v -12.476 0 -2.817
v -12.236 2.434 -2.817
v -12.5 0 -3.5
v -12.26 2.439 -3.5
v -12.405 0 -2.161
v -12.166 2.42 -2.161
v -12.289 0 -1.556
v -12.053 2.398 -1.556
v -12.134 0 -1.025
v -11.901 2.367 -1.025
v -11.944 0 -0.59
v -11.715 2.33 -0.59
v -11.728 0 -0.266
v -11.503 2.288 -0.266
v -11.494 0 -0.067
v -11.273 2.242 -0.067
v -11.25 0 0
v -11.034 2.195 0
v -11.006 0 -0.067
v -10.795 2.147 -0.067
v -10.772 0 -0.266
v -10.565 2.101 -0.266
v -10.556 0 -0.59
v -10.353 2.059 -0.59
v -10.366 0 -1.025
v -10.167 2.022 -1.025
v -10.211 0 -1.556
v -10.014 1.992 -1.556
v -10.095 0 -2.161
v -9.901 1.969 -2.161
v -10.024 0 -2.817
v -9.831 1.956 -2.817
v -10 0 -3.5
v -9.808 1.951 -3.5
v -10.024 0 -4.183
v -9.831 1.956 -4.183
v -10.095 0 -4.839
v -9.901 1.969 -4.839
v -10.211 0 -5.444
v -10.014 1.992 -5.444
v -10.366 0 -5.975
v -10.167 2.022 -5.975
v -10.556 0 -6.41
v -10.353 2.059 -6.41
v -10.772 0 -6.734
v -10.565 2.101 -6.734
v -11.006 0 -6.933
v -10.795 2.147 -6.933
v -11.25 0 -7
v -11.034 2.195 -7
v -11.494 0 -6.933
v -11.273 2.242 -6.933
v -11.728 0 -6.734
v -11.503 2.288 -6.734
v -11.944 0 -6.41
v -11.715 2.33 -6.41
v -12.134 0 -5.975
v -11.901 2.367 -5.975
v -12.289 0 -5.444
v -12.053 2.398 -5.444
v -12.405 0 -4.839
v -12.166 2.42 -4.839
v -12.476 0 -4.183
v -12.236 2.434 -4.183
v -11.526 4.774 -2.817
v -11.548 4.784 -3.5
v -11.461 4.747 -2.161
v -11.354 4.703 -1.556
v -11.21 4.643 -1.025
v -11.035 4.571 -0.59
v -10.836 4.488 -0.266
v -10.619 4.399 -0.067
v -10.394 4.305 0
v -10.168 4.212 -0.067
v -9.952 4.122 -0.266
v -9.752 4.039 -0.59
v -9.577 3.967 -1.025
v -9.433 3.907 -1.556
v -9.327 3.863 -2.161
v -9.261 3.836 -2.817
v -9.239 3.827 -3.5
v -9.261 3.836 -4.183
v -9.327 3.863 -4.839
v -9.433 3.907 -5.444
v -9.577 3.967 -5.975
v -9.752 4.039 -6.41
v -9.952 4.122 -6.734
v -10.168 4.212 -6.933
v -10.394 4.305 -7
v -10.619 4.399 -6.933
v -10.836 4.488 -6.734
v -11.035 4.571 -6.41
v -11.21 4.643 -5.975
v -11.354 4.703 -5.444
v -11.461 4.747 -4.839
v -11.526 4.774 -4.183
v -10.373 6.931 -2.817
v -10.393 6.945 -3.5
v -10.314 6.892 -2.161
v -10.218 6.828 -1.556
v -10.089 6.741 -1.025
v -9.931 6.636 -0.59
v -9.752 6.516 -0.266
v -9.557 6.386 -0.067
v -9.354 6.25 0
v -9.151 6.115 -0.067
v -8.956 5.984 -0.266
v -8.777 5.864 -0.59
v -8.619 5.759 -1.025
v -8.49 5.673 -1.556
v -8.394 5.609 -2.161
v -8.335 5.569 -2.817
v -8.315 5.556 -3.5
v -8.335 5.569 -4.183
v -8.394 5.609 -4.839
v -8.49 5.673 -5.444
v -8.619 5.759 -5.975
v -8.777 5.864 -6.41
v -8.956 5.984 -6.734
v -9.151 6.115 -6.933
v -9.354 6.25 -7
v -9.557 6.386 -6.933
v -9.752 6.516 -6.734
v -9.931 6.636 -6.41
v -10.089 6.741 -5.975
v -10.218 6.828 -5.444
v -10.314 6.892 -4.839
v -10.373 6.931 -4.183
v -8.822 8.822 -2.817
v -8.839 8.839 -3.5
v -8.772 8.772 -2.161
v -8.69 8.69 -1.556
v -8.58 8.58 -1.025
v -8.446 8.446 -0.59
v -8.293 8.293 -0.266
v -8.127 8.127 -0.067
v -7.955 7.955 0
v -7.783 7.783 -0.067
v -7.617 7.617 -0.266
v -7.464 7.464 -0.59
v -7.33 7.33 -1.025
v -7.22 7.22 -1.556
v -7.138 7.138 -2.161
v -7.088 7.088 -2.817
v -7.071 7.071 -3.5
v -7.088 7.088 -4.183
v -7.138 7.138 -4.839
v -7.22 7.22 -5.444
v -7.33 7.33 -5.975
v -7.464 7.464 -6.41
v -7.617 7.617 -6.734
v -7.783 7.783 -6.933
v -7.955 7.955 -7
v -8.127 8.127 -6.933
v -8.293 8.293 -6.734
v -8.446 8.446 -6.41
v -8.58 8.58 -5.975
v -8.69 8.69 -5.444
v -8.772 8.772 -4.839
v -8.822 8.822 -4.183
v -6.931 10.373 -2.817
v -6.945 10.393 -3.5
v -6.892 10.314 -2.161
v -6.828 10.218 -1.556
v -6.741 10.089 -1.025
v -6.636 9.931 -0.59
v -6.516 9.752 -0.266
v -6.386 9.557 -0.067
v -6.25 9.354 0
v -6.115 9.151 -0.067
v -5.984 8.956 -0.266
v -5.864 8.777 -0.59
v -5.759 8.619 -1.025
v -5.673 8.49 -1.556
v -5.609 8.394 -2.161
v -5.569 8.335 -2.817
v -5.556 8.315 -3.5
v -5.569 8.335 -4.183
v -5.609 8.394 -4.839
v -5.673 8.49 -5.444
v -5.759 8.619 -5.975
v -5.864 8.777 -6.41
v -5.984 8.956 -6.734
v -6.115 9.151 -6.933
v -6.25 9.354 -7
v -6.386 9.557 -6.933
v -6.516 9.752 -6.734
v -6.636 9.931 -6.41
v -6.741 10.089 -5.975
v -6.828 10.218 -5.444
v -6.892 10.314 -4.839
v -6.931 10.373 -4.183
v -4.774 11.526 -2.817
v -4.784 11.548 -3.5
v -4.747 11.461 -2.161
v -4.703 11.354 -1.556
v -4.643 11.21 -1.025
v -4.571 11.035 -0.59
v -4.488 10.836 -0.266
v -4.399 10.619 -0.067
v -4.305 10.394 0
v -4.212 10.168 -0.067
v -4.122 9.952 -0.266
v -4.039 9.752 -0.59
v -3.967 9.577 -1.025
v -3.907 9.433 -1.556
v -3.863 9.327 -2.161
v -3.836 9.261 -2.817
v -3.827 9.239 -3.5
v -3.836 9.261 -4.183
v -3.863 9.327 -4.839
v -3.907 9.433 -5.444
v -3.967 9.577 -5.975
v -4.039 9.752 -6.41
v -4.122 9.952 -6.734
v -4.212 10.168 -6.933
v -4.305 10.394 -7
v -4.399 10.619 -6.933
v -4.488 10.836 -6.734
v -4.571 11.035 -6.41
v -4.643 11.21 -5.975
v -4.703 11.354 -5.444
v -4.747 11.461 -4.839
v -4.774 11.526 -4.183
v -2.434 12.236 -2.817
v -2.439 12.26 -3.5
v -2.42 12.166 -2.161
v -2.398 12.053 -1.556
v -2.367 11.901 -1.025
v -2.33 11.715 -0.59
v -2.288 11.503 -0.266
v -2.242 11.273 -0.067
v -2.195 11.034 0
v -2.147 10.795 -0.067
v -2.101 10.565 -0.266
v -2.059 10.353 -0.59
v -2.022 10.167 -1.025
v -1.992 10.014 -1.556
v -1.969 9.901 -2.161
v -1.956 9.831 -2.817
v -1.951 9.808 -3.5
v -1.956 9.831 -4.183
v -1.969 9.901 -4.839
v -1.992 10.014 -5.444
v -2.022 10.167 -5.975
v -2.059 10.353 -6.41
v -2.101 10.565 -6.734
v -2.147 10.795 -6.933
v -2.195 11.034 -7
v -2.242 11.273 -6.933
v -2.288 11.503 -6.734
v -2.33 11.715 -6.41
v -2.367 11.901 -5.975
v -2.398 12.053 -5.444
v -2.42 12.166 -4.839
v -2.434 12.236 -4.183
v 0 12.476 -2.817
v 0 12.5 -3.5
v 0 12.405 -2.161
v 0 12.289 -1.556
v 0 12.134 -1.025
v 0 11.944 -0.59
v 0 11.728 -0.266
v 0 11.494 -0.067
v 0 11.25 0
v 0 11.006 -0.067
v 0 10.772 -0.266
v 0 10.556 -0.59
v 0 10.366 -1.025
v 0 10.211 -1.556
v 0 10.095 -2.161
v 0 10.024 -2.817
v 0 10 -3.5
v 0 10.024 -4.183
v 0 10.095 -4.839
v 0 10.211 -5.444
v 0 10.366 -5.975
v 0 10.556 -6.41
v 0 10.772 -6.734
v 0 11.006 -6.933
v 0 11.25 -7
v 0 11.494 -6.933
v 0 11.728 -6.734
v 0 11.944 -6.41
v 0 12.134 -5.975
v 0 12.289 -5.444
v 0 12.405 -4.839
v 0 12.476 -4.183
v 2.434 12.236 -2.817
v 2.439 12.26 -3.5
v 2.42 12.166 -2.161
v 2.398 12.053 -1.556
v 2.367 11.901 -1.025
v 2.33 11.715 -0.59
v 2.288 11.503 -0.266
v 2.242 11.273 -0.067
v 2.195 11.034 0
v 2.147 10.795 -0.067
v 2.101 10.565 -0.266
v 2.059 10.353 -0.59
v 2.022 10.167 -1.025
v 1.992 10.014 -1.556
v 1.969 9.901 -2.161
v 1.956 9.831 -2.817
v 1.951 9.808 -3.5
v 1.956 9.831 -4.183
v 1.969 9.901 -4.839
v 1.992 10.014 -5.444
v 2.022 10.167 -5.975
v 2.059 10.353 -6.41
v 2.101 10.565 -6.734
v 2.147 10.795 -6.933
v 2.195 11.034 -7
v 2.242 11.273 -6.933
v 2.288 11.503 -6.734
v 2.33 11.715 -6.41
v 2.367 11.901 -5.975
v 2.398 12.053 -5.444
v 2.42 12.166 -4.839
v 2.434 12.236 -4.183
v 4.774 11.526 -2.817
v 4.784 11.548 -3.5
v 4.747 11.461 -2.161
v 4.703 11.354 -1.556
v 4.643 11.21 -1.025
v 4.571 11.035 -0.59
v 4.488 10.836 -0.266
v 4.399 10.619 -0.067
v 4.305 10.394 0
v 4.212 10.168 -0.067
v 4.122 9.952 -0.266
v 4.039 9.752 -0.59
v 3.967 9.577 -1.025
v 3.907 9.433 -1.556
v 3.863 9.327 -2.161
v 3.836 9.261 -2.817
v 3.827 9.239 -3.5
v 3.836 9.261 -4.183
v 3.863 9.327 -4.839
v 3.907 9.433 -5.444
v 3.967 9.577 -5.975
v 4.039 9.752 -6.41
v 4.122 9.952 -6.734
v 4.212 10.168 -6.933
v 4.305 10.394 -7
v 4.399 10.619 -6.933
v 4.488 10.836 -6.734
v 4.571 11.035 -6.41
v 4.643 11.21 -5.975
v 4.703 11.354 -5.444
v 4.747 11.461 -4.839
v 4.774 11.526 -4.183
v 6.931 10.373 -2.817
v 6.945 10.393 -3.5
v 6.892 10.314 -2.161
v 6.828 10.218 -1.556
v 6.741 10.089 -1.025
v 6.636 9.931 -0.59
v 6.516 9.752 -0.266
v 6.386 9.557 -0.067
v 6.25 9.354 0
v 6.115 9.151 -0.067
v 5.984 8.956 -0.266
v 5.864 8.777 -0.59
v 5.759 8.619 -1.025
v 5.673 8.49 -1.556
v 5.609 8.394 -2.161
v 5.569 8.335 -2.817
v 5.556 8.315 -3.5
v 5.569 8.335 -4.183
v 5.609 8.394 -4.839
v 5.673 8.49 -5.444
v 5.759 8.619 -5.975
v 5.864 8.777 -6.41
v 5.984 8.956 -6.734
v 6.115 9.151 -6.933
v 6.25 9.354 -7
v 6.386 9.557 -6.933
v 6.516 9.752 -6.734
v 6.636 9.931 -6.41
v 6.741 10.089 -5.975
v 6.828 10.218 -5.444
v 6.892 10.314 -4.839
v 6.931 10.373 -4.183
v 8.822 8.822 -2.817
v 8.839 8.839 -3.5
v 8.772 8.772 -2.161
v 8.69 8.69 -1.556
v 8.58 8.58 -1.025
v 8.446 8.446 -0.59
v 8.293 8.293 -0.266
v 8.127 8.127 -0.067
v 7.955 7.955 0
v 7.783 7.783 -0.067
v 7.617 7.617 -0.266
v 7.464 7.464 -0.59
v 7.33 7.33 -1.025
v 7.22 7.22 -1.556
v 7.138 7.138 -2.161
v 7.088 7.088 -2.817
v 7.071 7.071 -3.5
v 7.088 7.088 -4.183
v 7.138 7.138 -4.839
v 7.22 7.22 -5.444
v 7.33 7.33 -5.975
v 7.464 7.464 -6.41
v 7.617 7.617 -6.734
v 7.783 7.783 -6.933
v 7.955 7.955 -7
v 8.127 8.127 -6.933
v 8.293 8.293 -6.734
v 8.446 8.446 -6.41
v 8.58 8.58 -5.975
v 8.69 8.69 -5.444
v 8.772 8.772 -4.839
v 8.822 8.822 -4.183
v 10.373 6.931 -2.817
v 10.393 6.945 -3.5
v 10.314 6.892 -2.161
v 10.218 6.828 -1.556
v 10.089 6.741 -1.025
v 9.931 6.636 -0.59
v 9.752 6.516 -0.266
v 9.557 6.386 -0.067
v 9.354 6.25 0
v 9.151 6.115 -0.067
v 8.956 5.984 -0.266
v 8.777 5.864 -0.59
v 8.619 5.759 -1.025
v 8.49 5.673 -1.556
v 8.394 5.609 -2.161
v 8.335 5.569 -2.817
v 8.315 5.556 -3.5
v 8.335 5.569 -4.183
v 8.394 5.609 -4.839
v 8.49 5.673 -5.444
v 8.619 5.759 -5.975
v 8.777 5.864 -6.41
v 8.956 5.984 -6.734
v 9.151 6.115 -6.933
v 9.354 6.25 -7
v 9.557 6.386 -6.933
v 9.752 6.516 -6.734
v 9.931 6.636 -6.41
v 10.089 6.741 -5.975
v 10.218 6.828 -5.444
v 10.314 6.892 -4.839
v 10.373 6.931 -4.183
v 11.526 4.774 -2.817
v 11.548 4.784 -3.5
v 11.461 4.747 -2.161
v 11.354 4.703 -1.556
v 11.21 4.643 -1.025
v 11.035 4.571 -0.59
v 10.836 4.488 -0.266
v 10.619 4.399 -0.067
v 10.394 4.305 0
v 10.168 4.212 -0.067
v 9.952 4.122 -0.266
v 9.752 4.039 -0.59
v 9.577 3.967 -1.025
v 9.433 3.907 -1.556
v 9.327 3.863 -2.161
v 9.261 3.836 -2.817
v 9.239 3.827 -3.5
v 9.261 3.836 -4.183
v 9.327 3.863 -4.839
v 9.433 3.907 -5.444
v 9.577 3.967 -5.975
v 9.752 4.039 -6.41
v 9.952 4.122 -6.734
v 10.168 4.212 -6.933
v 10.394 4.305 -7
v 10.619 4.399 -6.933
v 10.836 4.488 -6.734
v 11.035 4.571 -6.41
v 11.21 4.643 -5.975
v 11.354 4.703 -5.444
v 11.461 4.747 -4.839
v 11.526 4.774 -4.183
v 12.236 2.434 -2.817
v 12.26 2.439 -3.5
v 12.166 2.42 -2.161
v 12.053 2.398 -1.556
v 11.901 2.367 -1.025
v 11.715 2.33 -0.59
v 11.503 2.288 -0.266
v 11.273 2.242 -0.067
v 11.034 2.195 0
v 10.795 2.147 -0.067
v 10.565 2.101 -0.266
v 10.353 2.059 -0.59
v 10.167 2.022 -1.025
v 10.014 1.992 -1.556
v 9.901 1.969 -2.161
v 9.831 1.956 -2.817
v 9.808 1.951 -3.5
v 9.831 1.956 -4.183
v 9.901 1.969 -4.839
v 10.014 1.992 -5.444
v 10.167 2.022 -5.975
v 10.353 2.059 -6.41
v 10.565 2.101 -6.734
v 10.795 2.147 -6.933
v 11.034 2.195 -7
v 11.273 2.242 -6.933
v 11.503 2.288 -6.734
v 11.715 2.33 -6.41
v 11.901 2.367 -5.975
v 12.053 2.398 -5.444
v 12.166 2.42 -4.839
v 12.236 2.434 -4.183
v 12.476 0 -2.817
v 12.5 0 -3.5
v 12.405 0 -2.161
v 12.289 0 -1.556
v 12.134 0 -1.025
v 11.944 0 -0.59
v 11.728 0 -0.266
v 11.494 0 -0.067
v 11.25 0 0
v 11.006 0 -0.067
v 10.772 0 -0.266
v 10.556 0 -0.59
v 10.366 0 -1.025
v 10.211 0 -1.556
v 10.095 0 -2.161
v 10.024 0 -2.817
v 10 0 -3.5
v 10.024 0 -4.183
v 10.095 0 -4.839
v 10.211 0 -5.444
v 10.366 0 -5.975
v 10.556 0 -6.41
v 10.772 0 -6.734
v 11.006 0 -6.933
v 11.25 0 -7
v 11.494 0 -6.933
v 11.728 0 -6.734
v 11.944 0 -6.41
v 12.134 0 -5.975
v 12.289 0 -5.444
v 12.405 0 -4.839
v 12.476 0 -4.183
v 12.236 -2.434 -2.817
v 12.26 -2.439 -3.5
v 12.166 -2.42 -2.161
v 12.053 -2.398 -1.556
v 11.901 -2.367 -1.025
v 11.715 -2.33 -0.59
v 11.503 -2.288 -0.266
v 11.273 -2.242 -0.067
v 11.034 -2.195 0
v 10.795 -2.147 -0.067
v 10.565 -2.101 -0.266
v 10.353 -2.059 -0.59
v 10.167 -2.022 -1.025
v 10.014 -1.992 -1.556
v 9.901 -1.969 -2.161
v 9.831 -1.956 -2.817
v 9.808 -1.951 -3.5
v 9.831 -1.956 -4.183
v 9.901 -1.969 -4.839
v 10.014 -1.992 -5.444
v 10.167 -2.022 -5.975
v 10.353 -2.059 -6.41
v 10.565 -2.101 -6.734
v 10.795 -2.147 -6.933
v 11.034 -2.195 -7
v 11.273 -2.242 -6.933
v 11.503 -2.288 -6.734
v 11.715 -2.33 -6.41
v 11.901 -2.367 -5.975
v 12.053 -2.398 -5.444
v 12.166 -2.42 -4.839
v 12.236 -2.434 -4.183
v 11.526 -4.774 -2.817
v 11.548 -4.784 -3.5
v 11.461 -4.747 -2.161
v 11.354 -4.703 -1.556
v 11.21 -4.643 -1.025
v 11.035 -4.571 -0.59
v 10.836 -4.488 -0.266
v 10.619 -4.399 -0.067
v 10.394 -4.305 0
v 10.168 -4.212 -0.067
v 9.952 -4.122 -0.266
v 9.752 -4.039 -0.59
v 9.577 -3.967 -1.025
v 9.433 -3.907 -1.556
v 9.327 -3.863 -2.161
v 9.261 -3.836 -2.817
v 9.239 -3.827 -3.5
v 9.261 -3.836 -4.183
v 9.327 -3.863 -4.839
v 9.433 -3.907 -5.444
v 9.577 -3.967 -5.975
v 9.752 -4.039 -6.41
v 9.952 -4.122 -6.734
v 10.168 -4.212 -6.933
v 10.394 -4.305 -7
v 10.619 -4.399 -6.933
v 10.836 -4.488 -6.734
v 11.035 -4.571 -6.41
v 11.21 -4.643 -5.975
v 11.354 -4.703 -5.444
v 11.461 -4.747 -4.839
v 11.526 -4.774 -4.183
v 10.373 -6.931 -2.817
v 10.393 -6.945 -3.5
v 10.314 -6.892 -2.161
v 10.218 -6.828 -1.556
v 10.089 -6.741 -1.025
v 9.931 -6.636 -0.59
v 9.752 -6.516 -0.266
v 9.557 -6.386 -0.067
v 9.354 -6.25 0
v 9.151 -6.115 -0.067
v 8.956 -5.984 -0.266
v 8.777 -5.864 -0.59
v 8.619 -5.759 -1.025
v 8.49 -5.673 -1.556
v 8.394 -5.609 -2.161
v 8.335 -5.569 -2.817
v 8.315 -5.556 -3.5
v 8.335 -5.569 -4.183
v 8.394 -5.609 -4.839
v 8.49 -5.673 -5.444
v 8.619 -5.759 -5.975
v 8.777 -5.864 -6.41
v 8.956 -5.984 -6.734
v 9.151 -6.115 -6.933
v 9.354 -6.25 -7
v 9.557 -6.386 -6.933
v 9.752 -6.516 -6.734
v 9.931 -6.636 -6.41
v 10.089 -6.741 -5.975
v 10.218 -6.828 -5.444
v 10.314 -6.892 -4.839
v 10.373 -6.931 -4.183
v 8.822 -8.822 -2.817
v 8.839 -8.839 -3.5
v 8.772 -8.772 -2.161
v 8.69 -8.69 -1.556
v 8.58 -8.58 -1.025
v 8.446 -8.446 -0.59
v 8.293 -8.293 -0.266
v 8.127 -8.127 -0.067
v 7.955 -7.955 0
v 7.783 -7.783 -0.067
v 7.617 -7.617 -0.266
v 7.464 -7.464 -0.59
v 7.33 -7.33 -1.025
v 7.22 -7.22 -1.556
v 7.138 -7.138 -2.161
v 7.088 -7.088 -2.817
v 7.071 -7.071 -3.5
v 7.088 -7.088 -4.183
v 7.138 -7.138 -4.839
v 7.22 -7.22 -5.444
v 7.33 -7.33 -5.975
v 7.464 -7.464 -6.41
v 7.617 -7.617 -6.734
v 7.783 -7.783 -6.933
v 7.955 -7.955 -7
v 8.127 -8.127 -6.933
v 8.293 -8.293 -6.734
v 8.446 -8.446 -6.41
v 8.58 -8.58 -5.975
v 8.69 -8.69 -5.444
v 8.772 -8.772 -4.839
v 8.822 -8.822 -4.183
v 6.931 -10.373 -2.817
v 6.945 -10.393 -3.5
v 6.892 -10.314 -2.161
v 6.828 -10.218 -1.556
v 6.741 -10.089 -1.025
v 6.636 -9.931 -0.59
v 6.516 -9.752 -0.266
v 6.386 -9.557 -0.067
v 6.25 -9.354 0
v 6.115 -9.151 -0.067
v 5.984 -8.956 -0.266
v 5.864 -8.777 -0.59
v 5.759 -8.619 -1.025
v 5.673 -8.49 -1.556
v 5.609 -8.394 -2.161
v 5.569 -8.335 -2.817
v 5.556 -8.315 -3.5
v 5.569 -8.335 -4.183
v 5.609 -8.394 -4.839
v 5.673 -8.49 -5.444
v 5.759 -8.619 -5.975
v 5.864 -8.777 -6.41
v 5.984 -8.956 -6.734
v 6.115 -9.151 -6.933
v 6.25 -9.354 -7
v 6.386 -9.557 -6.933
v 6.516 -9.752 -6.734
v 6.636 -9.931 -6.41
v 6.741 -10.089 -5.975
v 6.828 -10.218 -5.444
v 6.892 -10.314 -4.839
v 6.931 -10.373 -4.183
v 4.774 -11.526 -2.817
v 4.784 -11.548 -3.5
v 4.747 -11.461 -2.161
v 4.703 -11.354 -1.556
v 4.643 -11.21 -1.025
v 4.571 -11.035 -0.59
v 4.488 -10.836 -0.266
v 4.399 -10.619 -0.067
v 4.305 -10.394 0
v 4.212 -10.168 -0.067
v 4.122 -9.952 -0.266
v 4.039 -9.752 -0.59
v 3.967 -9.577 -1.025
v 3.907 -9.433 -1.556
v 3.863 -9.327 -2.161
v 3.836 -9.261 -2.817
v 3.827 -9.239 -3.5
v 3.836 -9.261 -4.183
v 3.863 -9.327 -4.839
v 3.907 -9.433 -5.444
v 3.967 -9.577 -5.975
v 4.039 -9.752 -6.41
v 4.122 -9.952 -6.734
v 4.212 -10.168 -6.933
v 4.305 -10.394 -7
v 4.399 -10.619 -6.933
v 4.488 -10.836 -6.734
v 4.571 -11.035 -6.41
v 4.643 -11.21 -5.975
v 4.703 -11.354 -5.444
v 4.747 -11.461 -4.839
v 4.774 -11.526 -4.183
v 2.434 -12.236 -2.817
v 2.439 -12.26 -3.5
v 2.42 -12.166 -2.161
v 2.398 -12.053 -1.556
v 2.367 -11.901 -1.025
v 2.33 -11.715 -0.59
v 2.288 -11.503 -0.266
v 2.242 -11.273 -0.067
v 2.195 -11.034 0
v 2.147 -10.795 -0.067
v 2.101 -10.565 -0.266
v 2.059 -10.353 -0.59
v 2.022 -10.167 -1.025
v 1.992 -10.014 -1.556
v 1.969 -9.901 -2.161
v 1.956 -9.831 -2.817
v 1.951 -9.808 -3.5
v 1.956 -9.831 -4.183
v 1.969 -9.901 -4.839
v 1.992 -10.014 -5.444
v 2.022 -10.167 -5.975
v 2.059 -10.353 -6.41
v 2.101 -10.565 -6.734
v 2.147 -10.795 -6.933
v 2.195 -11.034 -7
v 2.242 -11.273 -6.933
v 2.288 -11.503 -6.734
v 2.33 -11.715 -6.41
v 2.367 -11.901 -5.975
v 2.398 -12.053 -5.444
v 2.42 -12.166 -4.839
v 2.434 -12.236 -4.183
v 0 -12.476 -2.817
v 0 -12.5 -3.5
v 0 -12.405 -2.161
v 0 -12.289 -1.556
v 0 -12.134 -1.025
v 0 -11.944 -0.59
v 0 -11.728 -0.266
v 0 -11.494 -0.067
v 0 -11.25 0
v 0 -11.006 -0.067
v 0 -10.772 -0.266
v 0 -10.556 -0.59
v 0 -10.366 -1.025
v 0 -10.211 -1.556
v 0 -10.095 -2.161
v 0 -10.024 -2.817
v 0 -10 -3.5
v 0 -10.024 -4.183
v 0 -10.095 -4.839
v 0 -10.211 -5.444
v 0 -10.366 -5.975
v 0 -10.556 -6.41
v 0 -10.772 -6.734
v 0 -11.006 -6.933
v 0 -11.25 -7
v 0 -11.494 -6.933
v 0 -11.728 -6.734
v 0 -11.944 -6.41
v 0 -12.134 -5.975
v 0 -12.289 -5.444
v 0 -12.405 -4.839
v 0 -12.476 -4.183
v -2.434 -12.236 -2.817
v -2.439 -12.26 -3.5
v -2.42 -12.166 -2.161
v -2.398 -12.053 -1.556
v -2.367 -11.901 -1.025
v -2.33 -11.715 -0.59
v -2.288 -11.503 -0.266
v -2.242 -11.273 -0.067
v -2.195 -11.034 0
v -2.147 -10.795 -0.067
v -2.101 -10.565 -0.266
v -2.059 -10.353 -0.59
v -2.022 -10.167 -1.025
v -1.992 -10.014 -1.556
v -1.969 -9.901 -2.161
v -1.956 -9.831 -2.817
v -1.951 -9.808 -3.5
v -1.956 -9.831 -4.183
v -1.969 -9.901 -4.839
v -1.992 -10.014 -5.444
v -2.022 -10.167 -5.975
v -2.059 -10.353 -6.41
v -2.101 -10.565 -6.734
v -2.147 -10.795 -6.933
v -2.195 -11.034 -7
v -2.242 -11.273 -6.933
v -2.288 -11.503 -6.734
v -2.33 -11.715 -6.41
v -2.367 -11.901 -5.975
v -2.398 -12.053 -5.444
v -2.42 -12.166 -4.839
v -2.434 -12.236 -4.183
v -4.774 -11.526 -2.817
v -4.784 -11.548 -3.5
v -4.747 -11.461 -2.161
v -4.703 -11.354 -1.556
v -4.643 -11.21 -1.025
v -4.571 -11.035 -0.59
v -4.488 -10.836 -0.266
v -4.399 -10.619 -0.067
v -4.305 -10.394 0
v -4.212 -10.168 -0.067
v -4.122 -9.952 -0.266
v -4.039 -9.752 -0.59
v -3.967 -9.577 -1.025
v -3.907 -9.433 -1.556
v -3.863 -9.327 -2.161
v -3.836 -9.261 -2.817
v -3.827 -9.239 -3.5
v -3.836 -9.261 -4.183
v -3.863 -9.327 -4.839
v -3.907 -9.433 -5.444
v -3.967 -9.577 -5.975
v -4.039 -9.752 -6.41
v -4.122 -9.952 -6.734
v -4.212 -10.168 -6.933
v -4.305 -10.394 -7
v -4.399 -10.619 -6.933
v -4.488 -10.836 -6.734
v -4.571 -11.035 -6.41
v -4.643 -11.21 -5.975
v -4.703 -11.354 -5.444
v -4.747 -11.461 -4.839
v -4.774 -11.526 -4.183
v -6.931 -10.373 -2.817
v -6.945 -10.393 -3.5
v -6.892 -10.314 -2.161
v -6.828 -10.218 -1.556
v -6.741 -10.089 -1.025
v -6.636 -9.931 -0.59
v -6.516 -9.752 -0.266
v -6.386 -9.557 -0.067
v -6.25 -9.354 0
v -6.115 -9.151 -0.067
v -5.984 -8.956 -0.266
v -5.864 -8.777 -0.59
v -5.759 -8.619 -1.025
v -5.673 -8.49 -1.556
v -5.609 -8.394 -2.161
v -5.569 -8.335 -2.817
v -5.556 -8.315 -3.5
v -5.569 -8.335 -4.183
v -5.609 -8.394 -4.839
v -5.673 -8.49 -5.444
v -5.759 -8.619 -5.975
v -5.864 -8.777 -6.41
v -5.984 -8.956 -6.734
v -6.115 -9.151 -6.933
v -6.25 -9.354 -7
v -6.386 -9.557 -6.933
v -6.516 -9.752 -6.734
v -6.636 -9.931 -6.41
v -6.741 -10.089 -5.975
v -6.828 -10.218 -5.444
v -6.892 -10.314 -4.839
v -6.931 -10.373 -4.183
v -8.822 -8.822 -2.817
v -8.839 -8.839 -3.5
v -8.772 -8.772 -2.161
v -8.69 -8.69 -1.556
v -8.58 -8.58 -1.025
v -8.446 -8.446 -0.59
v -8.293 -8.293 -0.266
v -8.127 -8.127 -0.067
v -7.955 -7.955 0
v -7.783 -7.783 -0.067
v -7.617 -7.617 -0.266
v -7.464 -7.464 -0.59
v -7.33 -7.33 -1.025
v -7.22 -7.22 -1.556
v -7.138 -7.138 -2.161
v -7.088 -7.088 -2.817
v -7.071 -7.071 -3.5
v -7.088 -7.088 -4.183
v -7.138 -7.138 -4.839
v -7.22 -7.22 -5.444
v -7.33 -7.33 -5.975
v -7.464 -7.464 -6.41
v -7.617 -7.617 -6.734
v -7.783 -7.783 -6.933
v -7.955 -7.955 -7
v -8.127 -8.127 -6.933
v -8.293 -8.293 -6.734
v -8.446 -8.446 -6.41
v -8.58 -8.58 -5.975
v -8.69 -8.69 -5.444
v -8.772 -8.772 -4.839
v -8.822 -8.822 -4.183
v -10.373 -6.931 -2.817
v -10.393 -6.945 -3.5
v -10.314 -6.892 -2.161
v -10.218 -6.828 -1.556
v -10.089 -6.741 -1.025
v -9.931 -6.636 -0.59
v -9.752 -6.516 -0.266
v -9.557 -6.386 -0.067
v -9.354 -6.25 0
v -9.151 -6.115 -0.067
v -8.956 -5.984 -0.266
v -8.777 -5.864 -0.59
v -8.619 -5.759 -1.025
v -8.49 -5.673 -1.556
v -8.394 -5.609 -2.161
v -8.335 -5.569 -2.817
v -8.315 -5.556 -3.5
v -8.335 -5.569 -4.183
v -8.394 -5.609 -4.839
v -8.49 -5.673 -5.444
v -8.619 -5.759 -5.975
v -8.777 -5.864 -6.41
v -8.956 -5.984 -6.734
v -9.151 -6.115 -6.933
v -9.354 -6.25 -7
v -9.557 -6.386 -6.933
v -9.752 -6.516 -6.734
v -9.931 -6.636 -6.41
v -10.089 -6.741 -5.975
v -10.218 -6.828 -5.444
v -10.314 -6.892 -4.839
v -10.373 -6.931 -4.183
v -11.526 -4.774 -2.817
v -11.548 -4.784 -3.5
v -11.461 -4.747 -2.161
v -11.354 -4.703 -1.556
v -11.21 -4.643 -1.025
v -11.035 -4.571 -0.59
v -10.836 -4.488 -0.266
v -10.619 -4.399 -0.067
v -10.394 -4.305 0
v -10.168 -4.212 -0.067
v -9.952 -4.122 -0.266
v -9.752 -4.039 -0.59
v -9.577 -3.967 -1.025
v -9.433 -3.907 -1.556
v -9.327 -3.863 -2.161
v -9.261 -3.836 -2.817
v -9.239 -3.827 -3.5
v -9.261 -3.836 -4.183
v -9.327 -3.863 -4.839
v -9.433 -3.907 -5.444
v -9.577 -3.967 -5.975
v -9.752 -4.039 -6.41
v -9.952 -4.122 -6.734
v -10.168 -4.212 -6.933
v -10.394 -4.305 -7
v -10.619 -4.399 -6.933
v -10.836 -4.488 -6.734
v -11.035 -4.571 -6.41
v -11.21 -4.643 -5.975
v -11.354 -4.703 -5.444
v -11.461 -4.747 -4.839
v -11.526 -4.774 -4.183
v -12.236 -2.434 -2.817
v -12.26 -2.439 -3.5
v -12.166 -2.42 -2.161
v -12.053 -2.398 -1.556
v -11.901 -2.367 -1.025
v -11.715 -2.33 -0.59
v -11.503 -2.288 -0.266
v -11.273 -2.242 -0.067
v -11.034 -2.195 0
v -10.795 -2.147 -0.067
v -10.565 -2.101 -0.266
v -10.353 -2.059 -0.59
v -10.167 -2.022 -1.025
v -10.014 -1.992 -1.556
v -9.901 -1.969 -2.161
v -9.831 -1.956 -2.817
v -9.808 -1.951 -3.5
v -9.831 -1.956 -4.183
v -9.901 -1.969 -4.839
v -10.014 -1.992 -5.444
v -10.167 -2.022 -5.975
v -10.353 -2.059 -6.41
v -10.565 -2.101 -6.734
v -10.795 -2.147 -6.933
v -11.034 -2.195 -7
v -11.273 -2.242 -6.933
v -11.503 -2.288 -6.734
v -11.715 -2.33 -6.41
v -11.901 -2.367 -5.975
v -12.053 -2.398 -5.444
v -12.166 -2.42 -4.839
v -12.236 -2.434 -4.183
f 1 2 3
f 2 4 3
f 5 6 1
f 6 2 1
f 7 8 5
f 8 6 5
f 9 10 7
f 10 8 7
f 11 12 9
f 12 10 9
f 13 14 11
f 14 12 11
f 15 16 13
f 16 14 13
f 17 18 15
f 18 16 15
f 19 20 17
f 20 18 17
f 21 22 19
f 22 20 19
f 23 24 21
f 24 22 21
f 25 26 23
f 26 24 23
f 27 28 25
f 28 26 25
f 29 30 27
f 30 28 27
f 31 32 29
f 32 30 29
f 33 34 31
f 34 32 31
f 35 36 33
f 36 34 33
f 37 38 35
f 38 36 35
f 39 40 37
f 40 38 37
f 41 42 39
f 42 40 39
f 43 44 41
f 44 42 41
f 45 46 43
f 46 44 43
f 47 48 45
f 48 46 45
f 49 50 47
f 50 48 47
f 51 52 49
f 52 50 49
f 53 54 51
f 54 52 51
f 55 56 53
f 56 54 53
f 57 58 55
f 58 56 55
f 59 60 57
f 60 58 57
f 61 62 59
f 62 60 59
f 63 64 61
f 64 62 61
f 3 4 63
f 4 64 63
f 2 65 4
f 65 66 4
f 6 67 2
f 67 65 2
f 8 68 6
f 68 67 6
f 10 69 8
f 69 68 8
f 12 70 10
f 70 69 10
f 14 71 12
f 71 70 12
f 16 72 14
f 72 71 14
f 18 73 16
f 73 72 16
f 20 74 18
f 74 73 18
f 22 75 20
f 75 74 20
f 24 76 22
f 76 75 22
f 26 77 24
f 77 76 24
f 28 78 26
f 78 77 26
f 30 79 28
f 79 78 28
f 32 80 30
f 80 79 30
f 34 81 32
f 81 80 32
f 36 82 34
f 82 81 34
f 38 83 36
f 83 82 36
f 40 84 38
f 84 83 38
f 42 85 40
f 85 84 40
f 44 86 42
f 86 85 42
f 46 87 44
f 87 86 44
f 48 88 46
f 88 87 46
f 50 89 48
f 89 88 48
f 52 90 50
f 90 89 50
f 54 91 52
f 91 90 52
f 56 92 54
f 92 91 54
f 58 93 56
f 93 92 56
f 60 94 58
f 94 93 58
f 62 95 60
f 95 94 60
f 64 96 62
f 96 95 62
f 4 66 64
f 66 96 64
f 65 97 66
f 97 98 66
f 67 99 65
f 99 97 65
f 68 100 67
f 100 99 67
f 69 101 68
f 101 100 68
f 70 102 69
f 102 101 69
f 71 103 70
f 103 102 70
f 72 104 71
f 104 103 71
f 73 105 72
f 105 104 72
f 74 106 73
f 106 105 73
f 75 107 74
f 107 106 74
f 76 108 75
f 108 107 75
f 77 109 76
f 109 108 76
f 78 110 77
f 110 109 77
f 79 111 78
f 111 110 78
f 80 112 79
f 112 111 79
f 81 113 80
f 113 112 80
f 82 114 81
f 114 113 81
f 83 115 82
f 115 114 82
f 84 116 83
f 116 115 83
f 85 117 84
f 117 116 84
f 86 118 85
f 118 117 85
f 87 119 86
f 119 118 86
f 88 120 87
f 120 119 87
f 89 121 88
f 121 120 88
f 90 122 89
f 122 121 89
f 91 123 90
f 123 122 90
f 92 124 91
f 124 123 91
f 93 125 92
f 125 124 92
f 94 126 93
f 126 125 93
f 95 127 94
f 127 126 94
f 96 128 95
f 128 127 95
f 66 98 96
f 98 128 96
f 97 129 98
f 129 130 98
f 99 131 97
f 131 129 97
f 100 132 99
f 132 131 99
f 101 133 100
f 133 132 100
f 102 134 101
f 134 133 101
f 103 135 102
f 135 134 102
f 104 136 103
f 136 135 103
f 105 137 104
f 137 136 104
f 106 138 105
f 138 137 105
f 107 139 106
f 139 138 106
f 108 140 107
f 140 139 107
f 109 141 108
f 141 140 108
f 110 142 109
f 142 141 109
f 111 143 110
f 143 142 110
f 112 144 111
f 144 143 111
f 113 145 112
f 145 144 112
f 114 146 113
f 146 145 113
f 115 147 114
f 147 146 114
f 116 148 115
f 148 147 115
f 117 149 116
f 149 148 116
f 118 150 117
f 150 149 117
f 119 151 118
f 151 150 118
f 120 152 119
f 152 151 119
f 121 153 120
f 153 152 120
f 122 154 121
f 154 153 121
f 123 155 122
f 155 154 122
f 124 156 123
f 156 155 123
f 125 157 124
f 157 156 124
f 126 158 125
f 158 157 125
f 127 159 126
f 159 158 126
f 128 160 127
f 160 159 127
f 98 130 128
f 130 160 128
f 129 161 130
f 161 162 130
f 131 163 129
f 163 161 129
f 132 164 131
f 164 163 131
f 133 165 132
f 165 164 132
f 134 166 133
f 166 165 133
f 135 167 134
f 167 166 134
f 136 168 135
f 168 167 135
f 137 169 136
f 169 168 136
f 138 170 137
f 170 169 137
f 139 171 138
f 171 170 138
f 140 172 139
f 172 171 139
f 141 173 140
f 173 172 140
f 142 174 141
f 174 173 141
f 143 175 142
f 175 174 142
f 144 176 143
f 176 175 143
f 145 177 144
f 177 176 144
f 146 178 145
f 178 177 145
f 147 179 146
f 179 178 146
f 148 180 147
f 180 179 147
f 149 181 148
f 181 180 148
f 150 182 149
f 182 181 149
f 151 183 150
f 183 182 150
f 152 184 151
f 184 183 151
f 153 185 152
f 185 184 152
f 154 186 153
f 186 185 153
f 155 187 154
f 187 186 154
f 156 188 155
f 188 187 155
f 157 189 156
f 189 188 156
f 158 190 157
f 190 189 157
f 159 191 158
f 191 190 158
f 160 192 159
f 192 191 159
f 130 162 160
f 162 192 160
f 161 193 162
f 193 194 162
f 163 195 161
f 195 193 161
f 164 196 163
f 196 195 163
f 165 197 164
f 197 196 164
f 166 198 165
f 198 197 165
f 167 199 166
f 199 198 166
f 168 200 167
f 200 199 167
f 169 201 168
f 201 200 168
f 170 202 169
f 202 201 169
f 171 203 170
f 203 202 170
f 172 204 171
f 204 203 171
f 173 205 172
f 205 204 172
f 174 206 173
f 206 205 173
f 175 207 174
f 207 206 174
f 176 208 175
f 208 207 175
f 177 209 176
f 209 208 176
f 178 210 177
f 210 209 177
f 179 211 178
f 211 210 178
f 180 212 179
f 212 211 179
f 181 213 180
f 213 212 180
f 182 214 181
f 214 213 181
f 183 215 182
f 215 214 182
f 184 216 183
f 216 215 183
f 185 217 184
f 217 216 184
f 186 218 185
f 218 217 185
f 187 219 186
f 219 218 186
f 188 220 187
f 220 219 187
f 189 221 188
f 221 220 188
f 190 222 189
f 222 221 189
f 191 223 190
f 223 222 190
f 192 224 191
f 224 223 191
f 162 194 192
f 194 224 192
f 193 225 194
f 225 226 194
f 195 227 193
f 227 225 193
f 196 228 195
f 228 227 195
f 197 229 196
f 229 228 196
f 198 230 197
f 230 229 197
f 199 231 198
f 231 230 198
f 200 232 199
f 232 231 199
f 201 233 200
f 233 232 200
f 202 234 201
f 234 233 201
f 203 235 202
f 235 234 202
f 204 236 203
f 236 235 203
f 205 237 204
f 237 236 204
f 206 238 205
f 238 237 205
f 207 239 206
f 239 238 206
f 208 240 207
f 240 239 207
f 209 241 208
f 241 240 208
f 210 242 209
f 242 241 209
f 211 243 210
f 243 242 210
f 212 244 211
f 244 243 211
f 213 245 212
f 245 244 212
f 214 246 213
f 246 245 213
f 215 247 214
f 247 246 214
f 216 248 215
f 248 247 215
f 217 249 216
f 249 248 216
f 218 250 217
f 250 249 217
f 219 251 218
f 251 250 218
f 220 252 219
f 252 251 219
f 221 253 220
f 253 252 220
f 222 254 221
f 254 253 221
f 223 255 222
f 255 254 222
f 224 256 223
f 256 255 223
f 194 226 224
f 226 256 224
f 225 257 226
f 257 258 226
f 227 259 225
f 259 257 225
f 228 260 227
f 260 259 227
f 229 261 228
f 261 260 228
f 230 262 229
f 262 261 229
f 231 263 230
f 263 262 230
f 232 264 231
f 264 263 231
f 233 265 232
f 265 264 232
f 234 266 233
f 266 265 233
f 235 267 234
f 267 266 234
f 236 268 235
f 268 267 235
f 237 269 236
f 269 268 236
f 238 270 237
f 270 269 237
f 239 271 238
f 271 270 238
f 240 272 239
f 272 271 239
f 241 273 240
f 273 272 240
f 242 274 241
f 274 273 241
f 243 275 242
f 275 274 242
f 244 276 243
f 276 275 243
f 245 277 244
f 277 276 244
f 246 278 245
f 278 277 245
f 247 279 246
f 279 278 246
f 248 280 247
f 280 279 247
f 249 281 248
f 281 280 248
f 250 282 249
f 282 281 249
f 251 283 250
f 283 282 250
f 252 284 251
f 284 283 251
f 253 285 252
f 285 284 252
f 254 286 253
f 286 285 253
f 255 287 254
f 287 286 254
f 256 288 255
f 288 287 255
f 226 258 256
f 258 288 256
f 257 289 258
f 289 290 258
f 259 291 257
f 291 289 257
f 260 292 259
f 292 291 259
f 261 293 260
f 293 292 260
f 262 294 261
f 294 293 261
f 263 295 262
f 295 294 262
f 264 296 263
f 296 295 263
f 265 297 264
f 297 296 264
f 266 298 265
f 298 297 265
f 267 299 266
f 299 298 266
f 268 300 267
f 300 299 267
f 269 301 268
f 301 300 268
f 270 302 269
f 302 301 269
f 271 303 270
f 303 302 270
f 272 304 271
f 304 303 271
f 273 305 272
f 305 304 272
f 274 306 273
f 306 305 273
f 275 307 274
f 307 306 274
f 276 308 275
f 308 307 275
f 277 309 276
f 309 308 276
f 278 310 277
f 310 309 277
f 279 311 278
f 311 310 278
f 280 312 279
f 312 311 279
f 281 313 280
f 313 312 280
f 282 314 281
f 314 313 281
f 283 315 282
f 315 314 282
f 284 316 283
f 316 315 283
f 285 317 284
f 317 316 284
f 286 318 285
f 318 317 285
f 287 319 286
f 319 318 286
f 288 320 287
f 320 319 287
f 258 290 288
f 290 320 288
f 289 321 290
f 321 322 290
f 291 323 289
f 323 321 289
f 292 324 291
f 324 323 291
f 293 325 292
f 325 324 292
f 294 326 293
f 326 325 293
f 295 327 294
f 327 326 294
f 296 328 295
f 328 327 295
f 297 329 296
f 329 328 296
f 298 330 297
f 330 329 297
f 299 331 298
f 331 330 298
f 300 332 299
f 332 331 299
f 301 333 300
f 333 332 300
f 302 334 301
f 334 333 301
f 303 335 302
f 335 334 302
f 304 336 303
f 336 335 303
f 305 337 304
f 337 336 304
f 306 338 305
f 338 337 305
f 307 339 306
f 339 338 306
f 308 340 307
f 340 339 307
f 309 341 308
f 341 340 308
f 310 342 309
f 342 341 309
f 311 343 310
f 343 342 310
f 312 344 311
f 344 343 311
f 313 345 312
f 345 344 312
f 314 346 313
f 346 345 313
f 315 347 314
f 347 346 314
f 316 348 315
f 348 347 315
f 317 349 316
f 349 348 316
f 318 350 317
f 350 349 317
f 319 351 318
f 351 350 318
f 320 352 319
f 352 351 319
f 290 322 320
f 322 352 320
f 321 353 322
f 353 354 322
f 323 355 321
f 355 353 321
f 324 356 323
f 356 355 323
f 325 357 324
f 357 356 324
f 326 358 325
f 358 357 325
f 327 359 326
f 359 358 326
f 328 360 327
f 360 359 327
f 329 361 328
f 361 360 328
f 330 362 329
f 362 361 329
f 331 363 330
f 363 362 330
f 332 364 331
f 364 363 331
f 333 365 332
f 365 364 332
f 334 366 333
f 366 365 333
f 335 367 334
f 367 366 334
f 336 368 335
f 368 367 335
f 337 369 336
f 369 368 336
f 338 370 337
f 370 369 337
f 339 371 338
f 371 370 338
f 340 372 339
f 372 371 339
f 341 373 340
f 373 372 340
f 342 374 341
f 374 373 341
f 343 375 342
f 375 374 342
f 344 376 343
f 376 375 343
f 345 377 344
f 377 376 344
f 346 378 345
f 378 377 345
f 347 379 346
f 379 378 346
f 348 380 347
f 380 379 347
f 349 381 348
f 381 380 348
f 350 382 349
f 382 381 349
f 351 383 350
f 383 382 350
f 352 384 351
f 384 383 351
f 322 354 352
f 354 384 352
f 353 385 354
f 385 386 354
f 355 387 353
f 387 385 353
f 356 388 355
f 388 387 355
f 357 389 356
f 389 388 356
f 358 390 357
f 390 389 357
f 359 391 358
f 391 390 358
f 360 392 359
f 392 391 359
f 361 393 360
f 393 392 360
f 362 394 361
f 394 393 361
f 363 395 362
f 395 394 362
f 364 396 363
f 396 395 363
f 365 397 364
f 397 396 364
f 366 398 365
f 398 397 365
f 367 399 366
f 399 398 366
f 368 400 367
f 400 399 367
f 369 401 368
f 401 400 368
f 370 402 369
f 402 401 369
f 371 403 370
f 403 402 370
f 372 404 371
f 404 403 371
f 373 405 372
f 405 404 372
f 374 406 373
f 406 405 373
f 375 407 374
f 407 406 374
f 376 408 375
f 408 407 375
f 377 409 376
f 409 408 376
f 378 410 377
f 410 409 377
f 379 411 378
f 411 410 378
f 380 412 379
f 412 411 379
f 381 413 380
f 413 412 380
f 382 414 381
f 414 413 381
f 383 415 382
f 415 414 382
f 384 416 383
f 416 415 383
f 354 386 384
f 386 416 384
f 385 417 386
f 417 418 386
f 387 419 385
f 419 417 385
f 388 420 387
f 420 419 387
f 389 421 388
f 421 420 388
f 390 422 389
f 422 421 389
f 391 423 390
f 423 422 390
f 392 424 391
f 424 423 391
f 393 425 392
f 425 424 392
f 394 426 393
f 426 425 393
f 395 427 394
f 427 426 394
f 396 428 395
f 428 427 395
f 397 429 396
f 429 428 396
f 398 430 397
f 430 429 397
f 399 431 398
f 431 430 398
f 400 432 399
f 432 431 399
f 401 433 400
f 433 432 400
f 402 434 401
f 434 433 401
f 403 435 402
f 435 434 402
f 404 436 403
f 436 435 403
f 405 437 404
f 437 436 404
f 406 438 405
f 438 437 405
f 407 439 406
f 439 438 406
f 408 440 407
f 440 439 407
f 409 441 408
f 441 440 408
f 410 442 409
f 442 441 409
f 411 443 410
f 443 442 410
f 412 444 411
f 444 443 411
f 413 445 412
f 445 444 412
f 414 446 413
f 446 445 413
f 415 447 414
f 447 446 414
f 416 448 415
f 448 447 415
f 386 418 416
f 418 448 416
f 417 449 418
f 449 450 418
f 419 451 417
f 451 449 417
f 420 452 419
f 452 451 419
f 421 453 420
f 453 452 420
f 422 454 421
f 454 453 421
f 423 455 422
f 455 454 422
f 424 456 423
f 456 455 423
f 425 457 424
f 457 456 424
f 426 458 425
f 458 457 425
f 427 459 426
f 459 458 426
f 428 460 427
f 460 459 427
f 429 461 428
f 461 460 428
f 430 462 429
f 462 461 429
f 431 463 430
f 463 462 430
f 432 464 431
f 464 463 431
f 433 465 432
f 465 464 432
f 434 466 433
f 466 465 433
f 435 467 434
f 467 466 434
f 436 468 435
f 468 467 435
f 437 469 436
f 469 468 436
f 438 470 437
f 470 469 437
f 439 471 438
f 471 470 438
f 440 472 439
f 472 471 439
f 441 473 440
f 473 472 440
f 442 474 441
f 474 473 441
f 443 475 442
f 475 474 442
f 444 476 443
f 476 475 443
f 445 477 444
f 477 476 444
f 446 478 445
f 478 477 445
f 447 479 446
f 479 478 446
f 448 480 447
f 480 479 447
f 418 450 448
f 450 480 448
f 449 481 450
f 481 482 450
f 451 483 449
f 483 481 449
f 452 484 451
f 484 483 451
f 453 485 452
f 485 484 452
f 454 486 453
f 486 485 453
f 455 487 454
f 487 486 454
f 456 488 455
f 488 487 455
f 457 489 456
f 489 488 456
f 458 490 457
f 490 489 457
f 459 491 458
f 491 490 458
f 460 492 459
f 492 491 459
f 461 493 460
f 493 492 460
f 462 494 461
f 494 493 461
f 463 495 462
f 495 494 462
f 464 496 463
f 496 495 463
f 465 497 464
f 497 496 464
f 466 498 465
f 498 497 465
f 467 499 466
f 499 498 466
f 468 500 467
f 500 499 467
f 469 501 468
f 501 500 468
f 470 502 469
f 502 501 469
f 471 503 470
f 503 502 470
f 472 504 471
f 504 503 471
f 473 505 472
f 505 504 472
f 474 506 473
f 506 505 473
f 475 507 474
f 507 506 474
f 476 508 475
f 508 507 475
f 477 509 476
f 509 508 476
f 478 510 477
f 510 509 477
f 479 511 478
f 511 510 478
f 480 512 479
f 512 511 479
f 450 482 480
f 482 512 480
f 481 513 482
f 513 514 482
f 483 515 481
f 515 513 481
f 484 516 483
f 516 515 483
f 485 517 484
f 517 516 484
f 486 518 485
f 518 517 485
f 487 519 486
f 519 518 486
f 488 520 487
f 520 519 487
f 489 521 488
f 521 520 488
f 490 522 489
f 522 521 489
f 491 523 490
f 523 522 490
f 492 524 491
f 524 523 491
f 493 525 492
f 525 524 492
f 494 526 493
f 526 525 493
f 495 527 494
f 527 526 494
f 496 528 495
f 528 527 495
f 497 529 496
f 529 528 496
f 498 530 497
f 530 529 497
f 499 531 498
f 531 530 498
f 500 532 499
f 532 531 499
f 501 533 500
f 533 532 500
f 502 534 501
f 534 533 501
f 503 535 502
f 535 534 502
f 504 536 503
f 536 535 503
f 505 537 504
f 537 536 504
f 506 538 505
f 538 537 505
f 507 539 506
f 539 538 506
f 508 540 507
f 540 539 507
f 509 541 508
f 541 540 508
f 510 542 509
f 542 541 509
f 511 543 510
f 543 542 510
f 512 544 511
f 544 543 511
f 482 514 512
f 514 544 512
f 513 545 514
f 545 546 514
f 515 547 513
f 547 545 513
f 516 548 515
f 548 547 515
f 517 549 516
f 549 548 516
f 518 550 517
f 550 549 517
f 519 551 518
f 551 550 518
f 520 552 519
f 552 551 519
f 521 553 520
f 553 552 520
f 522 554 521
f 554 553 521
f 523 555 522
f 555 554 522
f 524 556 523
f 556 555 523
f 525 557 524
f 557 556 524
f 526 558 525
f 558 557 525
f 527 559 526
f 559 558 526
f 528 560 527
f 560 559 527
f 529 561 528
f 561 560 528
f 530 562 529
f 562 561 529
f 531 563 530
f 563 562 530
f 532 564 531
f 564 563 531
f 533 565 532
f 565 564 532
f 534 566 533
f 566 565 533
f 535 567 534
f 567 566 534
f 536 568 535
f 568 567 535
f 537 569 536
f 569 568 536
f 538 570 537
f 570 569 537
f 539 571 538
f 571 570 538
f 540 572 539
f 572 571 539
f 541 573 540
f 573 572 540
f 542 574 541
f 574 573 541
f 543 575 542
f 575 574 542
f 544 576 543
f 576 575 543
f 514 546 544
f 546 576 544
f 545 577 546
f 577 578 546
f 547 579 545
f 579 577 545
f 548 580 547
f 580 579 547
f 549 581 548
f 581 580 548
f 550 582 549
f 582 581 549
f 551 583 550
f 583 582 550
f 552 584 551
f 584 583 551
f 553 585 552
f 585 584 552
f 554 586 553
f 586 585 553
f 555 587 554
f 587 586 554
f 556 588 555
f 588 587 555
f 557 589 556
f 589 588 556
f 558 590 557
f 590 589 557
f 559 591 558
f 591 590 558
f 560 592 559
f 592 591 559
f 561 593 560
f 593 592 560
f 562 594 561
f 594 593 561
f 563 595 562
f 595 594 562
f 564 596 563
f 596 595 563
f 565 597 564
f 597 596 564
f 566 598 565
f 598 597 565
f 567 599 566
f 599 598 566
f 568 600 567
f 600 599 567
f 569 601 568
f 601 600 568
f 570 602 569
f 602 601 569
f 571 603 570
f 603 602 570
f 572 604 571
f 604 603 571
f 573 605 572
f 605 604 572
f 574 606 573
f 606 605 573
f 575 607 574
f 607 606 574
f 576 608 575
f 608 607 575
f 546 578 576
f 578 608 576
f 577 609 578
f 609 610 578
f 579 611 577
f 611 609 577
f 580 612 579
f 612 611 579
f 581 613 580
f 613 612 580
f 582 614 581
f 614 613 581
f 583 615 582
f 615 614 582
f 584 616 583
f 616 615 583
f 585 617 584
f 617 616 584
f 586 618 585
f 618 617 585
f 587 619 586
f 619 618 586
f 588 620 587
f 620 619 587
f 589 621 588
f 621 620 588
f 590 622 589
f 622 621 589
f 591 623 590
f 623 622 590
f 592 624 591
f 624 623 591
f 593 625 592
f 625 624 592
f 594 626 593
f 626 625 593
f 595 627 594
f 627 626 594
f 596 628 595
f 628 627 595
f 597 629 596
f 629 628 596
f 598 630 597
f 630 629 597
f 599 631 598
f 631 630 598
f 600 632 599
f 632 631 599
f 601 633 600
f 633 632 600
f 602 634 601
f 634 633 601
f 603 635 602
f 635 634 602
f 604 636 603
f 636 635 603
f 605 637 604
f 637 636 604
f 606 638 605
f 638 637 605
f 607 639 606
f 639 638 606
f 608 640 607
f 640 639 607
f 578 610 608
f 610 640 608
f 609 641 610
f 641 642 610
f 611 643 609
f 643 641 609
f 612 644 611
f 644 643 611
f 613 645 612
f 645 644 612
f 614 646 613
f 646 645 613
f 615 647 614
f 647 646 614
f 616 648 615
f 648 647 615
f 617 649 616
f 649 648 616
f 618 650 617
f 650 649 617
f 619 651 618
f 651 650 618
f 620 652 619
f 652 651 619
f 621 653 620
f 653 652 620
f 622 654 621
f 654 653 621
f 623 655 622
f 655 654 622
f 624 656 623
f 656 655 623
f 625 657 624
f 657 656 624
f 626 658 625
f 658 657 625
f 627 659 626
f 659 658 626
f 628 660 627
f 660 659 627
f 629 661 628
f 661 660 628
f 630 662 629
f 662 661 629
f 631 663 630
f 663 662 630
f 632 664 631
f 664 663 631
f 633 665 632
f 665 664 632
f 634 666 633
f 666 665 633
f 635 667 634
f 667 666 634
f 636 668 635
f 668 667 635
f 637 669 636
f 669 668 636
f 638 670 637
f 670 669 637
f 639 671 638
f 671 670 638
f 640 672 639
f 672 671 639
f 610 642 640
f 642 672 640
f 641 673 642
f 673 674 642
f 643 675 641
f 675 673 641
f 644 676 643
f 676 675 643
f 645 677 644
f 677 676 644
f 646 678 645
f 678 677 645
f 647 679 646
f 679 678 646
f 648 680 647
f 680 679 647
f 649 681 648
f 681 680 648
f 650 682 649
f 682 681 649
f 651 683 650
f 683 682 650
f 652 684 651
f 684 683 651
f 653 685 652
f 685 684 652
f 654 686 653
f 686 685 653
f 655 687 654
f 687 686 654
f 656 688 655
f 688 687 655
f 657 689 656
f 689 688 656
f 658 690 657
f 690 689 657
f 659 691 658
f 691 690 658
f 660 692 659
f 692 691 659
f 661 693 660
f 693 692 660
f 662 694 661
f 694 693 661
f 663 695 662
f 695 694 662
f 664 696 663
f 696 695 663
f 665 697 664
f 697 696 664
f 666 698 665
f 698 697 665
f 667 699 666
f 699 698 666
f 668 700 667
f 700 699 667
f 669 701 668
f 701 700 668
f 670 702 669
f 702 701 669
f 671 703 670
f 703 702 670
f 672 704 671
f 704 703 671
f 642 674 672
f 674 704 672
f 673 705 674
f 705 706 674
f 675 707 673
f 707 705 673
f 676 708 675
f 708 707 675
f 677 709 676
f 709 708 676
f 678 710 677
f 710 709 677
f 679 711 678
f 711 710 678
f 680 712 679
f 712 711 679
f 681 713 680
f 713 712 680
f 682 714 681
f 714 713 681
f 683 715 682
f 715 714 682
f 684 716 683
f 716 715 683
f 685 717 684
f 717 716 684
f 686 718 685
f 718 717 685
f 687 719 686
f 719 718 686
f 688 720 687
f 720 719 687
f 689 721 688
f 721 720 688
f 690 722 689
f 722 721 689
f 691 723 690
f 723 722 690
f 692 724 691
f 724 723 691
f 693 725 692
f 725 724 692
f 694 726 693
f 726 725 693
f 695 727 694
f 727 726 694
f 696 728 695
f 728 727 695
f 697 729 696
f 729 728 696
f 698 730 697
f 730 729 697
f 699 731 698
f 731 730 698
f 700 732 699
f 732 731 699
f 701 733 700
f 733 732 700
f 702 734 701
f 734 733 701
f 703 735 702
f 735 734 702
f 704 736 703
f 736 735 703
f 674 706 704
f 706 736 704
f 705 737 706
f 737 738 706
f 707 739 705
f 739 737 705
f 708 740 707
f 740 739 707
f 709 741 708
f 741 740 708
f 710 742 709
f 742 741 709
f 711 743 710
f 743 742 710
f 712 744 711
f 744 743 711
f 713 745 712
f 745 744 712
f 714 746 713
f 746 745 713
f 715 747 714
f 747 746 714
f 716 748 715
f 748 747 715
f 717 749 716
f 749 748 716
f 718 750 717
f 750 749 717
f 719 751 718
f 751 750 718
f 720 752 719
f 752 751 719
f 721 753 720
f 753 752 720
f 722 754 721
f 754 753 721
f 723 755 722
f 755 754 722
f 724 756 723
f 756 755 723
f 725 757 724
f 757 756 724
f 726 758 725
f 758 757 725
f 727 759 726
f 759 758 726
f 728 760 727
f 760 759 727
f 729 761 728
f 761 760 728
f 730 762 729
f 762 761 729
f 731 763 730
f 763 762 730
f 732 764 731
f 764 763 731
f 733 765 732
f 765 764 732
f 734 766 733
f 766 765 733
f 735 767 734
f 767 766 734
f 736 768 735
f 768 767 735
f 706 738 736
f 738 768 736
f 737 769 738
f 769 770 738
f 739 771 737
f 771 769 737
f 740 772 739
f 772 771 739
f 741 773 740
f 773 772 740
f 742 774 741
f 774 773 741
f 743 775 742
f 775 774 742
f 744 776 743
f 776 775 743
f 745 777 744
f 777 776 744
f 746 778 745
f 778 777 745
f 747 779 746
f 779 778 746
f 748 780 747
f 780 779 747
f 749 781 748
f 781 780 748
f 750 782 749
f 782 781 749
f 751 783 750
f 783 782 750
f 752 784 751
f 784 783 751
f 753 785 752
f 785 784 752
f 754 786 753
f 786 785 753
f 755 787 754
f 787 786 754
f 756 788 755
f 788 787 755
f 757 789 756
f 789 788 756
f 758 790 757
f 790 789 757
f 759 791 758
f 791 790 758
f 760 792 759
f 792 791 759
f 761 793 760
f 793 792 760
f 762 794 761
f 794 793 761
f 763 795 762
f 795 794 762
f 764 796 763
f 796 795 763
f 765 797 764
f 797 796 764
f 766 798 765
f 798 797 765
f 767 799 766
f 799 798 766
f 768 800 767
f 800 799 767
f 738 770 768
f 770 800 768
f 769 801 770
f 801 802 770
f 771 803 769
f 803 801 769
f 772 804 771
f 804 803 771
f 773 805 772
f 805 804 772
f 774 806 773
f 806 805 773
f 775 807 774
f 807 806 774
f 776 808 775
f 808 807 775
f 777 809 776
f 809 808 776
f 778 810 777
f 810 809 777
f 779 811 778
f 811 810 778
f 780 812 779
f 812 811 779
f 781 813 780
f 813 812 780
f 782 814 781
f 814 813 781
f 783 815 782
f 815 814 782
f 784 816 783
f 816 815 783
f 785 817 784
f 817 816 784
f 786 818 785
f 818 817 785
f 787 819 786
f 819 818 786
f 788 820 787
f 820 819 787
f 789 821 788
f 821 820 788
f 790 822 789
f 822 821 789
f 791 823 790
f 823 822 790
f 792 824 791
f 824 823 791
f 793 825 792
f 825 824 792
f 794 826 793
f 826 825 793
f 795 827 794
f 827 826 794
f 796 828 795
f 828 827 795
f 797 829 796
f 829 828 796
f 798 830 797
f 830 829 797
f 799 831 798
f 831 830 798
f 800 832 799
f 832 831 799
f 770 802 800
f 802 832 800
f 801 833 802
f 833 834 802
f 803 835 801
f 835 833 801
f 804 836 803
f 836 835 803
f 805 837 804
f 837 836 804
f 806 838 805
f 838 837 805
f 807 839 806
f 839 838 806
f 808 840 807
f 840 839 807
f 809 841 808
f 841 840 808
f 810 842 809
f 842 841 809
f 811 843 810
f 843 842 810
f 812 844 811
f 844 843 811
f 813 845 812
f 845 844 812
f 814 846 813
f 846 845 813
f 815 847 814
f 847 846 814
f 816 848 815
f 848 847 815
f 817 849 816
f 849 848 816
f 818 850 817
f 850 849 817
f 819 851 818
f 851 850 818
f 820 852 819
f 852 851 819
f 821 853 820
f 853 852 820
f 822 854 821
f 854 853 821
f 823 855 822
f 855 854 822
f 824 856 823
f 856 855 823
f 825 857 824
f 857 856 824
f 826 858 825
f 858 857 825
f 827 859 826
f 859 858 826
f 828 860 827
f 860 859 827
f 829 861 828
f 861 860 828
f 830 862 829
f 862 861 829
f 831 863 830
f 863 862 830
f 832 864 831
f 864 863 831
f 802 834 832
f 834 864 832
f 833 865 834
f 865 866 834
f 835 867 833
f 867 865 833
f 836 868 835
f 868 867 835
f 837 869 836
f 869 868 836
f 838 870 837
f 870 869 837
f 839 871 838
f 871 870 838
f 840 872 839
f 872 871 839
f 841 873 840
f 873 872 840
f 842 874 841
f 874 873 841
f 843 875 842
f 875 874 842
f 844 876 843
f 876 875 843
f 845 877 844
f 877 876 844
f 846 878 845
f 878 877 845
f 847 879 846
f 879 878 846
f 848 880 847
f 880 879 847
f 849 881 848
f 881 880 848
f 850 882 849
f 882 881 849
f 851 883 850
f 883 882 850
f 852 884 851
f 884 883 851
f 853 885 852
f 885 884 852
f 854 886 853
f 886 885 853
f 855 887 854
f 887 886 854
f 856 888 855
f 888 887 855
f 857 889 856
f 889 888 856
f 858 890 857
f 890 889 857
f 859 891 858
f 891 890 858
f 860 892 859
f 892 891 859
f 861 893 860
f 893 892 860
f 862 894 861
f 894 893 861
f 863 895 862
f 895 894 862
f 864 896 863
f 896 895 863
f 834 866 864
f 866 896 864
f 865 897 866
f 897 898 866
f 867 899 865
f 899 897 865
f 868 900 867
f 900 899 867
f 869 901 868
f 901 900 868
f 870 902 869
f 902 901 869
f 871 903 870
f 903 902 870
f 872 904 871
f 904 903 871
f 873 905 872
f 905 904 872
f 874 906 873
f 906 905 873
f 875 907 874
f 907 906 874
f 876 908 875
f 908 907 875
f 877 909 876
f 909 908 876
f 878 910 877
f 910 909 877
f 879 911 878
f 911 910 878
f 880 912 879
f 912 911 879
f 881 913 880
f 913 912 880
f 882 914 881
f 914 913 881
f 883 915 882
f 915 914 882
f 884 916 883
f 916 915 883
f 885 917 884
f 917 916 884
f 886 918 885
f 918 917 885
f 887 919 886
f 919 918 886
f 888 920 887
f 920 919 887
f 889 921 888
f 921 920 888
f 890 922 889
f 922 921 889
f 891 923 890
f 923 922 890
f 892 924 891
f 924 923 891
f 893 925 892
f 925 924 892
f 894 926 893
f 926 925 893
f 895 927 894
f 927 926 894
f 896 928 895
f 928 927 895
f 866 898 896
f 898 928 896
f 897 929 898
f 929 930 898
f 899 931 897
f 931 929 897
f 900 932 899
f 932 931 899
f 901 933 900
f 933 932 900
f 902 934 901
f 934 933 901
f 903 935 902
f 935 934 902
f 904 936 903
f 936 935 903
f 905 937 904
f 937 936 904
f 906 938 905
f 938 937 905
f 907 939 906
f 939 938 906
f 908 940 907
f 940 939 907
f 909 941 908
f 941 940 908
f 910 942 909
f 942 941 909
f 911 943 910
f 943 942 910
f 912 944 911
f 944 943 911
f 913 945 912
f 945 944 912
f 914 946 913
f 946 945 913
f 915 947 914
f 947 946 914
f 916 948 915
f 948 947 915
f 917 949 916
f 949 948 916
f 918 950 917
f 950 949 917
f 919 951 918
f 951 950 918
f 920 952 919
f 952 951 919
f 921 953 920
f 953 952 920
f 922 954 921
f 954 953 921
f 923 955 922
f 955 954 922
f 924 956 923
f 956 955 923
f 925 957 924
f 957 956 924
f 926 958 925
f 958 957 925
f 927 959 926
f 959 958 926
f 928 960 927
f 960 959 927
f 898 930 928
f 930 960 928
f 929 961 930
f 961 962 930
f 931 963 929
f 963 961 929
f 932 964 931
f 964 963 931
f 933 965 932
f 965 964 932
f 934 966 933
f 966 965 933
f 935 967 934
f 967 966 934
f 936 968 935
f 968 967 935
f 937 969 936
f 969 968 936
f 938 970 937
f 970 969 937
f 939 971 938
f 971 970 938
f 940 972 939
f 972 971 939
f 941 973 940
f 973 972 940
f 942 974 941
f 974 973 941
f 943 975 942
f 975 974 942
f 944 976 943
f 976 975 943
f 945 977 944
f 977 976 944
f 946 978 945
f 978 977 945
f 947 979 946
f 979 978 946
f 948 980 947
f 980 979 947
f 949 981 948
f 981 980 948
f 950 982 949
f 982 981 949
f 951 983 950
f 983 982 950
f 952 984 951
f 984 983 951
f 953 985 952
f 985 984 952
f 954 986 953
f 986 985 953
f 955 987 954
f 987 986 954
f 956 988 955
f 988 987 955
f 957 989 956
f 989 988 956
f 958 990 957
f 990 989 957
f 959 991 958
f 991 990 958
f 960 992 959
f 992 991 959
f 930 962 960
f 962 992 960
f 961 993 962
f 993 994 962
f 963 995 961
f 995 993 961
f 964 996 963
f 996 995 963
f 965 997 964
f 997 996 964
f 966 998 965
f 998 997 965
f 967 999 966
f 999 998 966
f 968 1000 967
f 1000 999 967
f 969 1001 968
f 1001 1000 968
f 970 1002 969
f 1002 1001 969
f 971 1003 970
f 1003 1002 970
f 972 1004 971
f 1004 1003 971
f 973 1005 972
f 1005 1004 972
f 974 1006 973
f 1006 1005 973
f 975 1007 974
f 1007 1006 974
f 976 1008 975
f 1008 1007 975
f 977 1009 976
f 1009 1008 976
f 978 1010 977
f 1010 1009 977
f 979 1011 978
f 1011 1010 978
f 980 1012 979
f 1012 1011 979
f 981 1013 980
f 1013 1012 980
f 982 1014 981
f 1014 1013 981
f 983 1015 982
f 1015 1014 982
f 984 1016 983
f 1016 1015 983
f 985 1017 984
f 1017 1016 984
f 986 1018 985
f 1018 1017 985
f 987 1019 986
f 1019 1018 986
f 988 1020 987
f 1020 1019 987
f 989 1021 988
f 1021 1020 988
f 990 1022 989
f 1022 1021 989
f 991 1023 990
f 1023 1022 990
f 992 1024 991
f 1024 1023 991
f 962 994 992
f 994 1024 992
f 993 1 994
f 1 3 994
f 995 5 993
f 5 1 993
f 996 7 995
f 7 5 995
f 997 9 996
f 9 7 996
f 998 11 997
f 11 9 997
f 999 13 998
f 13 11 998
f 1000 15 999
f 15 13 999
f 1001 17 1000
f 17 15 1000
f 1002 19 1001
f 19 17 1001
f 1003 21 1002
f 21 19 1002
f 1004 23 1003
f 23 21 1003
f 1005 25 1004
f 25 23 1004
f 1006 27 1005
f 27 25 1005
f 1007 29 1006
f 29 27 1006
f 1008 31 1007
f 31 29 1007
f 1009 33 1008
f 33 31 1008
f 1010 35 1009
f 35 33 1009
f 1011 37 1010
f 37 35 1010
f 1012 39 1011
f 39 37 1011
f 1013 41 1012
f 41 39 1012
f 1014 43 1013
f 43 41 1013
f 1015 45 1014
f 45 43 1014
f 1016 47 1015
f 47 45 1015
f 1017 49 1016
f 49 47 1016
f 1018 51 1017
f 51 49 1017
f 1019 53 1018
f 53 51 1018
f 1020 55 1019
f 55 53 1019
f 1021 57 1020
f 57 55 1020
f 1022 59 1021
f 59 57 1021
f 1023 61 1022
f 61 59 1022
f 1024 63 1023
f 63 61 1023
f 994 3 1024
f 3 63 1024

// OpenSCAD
// golden case: band-flat — the first permitted primitive (plain ring band)
// pinned: $fn=32 (preview tier) · budget 250ms · paracraft-jewelry harness v1
// house style (cubehero organizing principles): semantic module interface,
// stable params, design record at top — construction details hidden inside.
$fn = 32;

/* [design record] */
ring_size_mm = 20;       // inner diameter
band_width_mm = 7;
band_thickness_mm = 2.5;

// ring_band — flat band, elliptical cross-section.
// interface is semantic: tell it what you want, not how it's built.
module ring_band(size_mm, width_mm, thickness_mm) {
  ring_r = size_mm / 2;
  mid_r = ring_r + thickness_mm / 2;
  translate([0, 0, -width_mm / 2])
    scale([1, 1, width_mm / thickness_mm])
      rotate_extrude(convexity = 10)
        translate([mid_r, 0, 0]) circle(d = thickness_mm);
}

ring_band(ring_size_mm, band_width_mm, band_thickness_mm);
